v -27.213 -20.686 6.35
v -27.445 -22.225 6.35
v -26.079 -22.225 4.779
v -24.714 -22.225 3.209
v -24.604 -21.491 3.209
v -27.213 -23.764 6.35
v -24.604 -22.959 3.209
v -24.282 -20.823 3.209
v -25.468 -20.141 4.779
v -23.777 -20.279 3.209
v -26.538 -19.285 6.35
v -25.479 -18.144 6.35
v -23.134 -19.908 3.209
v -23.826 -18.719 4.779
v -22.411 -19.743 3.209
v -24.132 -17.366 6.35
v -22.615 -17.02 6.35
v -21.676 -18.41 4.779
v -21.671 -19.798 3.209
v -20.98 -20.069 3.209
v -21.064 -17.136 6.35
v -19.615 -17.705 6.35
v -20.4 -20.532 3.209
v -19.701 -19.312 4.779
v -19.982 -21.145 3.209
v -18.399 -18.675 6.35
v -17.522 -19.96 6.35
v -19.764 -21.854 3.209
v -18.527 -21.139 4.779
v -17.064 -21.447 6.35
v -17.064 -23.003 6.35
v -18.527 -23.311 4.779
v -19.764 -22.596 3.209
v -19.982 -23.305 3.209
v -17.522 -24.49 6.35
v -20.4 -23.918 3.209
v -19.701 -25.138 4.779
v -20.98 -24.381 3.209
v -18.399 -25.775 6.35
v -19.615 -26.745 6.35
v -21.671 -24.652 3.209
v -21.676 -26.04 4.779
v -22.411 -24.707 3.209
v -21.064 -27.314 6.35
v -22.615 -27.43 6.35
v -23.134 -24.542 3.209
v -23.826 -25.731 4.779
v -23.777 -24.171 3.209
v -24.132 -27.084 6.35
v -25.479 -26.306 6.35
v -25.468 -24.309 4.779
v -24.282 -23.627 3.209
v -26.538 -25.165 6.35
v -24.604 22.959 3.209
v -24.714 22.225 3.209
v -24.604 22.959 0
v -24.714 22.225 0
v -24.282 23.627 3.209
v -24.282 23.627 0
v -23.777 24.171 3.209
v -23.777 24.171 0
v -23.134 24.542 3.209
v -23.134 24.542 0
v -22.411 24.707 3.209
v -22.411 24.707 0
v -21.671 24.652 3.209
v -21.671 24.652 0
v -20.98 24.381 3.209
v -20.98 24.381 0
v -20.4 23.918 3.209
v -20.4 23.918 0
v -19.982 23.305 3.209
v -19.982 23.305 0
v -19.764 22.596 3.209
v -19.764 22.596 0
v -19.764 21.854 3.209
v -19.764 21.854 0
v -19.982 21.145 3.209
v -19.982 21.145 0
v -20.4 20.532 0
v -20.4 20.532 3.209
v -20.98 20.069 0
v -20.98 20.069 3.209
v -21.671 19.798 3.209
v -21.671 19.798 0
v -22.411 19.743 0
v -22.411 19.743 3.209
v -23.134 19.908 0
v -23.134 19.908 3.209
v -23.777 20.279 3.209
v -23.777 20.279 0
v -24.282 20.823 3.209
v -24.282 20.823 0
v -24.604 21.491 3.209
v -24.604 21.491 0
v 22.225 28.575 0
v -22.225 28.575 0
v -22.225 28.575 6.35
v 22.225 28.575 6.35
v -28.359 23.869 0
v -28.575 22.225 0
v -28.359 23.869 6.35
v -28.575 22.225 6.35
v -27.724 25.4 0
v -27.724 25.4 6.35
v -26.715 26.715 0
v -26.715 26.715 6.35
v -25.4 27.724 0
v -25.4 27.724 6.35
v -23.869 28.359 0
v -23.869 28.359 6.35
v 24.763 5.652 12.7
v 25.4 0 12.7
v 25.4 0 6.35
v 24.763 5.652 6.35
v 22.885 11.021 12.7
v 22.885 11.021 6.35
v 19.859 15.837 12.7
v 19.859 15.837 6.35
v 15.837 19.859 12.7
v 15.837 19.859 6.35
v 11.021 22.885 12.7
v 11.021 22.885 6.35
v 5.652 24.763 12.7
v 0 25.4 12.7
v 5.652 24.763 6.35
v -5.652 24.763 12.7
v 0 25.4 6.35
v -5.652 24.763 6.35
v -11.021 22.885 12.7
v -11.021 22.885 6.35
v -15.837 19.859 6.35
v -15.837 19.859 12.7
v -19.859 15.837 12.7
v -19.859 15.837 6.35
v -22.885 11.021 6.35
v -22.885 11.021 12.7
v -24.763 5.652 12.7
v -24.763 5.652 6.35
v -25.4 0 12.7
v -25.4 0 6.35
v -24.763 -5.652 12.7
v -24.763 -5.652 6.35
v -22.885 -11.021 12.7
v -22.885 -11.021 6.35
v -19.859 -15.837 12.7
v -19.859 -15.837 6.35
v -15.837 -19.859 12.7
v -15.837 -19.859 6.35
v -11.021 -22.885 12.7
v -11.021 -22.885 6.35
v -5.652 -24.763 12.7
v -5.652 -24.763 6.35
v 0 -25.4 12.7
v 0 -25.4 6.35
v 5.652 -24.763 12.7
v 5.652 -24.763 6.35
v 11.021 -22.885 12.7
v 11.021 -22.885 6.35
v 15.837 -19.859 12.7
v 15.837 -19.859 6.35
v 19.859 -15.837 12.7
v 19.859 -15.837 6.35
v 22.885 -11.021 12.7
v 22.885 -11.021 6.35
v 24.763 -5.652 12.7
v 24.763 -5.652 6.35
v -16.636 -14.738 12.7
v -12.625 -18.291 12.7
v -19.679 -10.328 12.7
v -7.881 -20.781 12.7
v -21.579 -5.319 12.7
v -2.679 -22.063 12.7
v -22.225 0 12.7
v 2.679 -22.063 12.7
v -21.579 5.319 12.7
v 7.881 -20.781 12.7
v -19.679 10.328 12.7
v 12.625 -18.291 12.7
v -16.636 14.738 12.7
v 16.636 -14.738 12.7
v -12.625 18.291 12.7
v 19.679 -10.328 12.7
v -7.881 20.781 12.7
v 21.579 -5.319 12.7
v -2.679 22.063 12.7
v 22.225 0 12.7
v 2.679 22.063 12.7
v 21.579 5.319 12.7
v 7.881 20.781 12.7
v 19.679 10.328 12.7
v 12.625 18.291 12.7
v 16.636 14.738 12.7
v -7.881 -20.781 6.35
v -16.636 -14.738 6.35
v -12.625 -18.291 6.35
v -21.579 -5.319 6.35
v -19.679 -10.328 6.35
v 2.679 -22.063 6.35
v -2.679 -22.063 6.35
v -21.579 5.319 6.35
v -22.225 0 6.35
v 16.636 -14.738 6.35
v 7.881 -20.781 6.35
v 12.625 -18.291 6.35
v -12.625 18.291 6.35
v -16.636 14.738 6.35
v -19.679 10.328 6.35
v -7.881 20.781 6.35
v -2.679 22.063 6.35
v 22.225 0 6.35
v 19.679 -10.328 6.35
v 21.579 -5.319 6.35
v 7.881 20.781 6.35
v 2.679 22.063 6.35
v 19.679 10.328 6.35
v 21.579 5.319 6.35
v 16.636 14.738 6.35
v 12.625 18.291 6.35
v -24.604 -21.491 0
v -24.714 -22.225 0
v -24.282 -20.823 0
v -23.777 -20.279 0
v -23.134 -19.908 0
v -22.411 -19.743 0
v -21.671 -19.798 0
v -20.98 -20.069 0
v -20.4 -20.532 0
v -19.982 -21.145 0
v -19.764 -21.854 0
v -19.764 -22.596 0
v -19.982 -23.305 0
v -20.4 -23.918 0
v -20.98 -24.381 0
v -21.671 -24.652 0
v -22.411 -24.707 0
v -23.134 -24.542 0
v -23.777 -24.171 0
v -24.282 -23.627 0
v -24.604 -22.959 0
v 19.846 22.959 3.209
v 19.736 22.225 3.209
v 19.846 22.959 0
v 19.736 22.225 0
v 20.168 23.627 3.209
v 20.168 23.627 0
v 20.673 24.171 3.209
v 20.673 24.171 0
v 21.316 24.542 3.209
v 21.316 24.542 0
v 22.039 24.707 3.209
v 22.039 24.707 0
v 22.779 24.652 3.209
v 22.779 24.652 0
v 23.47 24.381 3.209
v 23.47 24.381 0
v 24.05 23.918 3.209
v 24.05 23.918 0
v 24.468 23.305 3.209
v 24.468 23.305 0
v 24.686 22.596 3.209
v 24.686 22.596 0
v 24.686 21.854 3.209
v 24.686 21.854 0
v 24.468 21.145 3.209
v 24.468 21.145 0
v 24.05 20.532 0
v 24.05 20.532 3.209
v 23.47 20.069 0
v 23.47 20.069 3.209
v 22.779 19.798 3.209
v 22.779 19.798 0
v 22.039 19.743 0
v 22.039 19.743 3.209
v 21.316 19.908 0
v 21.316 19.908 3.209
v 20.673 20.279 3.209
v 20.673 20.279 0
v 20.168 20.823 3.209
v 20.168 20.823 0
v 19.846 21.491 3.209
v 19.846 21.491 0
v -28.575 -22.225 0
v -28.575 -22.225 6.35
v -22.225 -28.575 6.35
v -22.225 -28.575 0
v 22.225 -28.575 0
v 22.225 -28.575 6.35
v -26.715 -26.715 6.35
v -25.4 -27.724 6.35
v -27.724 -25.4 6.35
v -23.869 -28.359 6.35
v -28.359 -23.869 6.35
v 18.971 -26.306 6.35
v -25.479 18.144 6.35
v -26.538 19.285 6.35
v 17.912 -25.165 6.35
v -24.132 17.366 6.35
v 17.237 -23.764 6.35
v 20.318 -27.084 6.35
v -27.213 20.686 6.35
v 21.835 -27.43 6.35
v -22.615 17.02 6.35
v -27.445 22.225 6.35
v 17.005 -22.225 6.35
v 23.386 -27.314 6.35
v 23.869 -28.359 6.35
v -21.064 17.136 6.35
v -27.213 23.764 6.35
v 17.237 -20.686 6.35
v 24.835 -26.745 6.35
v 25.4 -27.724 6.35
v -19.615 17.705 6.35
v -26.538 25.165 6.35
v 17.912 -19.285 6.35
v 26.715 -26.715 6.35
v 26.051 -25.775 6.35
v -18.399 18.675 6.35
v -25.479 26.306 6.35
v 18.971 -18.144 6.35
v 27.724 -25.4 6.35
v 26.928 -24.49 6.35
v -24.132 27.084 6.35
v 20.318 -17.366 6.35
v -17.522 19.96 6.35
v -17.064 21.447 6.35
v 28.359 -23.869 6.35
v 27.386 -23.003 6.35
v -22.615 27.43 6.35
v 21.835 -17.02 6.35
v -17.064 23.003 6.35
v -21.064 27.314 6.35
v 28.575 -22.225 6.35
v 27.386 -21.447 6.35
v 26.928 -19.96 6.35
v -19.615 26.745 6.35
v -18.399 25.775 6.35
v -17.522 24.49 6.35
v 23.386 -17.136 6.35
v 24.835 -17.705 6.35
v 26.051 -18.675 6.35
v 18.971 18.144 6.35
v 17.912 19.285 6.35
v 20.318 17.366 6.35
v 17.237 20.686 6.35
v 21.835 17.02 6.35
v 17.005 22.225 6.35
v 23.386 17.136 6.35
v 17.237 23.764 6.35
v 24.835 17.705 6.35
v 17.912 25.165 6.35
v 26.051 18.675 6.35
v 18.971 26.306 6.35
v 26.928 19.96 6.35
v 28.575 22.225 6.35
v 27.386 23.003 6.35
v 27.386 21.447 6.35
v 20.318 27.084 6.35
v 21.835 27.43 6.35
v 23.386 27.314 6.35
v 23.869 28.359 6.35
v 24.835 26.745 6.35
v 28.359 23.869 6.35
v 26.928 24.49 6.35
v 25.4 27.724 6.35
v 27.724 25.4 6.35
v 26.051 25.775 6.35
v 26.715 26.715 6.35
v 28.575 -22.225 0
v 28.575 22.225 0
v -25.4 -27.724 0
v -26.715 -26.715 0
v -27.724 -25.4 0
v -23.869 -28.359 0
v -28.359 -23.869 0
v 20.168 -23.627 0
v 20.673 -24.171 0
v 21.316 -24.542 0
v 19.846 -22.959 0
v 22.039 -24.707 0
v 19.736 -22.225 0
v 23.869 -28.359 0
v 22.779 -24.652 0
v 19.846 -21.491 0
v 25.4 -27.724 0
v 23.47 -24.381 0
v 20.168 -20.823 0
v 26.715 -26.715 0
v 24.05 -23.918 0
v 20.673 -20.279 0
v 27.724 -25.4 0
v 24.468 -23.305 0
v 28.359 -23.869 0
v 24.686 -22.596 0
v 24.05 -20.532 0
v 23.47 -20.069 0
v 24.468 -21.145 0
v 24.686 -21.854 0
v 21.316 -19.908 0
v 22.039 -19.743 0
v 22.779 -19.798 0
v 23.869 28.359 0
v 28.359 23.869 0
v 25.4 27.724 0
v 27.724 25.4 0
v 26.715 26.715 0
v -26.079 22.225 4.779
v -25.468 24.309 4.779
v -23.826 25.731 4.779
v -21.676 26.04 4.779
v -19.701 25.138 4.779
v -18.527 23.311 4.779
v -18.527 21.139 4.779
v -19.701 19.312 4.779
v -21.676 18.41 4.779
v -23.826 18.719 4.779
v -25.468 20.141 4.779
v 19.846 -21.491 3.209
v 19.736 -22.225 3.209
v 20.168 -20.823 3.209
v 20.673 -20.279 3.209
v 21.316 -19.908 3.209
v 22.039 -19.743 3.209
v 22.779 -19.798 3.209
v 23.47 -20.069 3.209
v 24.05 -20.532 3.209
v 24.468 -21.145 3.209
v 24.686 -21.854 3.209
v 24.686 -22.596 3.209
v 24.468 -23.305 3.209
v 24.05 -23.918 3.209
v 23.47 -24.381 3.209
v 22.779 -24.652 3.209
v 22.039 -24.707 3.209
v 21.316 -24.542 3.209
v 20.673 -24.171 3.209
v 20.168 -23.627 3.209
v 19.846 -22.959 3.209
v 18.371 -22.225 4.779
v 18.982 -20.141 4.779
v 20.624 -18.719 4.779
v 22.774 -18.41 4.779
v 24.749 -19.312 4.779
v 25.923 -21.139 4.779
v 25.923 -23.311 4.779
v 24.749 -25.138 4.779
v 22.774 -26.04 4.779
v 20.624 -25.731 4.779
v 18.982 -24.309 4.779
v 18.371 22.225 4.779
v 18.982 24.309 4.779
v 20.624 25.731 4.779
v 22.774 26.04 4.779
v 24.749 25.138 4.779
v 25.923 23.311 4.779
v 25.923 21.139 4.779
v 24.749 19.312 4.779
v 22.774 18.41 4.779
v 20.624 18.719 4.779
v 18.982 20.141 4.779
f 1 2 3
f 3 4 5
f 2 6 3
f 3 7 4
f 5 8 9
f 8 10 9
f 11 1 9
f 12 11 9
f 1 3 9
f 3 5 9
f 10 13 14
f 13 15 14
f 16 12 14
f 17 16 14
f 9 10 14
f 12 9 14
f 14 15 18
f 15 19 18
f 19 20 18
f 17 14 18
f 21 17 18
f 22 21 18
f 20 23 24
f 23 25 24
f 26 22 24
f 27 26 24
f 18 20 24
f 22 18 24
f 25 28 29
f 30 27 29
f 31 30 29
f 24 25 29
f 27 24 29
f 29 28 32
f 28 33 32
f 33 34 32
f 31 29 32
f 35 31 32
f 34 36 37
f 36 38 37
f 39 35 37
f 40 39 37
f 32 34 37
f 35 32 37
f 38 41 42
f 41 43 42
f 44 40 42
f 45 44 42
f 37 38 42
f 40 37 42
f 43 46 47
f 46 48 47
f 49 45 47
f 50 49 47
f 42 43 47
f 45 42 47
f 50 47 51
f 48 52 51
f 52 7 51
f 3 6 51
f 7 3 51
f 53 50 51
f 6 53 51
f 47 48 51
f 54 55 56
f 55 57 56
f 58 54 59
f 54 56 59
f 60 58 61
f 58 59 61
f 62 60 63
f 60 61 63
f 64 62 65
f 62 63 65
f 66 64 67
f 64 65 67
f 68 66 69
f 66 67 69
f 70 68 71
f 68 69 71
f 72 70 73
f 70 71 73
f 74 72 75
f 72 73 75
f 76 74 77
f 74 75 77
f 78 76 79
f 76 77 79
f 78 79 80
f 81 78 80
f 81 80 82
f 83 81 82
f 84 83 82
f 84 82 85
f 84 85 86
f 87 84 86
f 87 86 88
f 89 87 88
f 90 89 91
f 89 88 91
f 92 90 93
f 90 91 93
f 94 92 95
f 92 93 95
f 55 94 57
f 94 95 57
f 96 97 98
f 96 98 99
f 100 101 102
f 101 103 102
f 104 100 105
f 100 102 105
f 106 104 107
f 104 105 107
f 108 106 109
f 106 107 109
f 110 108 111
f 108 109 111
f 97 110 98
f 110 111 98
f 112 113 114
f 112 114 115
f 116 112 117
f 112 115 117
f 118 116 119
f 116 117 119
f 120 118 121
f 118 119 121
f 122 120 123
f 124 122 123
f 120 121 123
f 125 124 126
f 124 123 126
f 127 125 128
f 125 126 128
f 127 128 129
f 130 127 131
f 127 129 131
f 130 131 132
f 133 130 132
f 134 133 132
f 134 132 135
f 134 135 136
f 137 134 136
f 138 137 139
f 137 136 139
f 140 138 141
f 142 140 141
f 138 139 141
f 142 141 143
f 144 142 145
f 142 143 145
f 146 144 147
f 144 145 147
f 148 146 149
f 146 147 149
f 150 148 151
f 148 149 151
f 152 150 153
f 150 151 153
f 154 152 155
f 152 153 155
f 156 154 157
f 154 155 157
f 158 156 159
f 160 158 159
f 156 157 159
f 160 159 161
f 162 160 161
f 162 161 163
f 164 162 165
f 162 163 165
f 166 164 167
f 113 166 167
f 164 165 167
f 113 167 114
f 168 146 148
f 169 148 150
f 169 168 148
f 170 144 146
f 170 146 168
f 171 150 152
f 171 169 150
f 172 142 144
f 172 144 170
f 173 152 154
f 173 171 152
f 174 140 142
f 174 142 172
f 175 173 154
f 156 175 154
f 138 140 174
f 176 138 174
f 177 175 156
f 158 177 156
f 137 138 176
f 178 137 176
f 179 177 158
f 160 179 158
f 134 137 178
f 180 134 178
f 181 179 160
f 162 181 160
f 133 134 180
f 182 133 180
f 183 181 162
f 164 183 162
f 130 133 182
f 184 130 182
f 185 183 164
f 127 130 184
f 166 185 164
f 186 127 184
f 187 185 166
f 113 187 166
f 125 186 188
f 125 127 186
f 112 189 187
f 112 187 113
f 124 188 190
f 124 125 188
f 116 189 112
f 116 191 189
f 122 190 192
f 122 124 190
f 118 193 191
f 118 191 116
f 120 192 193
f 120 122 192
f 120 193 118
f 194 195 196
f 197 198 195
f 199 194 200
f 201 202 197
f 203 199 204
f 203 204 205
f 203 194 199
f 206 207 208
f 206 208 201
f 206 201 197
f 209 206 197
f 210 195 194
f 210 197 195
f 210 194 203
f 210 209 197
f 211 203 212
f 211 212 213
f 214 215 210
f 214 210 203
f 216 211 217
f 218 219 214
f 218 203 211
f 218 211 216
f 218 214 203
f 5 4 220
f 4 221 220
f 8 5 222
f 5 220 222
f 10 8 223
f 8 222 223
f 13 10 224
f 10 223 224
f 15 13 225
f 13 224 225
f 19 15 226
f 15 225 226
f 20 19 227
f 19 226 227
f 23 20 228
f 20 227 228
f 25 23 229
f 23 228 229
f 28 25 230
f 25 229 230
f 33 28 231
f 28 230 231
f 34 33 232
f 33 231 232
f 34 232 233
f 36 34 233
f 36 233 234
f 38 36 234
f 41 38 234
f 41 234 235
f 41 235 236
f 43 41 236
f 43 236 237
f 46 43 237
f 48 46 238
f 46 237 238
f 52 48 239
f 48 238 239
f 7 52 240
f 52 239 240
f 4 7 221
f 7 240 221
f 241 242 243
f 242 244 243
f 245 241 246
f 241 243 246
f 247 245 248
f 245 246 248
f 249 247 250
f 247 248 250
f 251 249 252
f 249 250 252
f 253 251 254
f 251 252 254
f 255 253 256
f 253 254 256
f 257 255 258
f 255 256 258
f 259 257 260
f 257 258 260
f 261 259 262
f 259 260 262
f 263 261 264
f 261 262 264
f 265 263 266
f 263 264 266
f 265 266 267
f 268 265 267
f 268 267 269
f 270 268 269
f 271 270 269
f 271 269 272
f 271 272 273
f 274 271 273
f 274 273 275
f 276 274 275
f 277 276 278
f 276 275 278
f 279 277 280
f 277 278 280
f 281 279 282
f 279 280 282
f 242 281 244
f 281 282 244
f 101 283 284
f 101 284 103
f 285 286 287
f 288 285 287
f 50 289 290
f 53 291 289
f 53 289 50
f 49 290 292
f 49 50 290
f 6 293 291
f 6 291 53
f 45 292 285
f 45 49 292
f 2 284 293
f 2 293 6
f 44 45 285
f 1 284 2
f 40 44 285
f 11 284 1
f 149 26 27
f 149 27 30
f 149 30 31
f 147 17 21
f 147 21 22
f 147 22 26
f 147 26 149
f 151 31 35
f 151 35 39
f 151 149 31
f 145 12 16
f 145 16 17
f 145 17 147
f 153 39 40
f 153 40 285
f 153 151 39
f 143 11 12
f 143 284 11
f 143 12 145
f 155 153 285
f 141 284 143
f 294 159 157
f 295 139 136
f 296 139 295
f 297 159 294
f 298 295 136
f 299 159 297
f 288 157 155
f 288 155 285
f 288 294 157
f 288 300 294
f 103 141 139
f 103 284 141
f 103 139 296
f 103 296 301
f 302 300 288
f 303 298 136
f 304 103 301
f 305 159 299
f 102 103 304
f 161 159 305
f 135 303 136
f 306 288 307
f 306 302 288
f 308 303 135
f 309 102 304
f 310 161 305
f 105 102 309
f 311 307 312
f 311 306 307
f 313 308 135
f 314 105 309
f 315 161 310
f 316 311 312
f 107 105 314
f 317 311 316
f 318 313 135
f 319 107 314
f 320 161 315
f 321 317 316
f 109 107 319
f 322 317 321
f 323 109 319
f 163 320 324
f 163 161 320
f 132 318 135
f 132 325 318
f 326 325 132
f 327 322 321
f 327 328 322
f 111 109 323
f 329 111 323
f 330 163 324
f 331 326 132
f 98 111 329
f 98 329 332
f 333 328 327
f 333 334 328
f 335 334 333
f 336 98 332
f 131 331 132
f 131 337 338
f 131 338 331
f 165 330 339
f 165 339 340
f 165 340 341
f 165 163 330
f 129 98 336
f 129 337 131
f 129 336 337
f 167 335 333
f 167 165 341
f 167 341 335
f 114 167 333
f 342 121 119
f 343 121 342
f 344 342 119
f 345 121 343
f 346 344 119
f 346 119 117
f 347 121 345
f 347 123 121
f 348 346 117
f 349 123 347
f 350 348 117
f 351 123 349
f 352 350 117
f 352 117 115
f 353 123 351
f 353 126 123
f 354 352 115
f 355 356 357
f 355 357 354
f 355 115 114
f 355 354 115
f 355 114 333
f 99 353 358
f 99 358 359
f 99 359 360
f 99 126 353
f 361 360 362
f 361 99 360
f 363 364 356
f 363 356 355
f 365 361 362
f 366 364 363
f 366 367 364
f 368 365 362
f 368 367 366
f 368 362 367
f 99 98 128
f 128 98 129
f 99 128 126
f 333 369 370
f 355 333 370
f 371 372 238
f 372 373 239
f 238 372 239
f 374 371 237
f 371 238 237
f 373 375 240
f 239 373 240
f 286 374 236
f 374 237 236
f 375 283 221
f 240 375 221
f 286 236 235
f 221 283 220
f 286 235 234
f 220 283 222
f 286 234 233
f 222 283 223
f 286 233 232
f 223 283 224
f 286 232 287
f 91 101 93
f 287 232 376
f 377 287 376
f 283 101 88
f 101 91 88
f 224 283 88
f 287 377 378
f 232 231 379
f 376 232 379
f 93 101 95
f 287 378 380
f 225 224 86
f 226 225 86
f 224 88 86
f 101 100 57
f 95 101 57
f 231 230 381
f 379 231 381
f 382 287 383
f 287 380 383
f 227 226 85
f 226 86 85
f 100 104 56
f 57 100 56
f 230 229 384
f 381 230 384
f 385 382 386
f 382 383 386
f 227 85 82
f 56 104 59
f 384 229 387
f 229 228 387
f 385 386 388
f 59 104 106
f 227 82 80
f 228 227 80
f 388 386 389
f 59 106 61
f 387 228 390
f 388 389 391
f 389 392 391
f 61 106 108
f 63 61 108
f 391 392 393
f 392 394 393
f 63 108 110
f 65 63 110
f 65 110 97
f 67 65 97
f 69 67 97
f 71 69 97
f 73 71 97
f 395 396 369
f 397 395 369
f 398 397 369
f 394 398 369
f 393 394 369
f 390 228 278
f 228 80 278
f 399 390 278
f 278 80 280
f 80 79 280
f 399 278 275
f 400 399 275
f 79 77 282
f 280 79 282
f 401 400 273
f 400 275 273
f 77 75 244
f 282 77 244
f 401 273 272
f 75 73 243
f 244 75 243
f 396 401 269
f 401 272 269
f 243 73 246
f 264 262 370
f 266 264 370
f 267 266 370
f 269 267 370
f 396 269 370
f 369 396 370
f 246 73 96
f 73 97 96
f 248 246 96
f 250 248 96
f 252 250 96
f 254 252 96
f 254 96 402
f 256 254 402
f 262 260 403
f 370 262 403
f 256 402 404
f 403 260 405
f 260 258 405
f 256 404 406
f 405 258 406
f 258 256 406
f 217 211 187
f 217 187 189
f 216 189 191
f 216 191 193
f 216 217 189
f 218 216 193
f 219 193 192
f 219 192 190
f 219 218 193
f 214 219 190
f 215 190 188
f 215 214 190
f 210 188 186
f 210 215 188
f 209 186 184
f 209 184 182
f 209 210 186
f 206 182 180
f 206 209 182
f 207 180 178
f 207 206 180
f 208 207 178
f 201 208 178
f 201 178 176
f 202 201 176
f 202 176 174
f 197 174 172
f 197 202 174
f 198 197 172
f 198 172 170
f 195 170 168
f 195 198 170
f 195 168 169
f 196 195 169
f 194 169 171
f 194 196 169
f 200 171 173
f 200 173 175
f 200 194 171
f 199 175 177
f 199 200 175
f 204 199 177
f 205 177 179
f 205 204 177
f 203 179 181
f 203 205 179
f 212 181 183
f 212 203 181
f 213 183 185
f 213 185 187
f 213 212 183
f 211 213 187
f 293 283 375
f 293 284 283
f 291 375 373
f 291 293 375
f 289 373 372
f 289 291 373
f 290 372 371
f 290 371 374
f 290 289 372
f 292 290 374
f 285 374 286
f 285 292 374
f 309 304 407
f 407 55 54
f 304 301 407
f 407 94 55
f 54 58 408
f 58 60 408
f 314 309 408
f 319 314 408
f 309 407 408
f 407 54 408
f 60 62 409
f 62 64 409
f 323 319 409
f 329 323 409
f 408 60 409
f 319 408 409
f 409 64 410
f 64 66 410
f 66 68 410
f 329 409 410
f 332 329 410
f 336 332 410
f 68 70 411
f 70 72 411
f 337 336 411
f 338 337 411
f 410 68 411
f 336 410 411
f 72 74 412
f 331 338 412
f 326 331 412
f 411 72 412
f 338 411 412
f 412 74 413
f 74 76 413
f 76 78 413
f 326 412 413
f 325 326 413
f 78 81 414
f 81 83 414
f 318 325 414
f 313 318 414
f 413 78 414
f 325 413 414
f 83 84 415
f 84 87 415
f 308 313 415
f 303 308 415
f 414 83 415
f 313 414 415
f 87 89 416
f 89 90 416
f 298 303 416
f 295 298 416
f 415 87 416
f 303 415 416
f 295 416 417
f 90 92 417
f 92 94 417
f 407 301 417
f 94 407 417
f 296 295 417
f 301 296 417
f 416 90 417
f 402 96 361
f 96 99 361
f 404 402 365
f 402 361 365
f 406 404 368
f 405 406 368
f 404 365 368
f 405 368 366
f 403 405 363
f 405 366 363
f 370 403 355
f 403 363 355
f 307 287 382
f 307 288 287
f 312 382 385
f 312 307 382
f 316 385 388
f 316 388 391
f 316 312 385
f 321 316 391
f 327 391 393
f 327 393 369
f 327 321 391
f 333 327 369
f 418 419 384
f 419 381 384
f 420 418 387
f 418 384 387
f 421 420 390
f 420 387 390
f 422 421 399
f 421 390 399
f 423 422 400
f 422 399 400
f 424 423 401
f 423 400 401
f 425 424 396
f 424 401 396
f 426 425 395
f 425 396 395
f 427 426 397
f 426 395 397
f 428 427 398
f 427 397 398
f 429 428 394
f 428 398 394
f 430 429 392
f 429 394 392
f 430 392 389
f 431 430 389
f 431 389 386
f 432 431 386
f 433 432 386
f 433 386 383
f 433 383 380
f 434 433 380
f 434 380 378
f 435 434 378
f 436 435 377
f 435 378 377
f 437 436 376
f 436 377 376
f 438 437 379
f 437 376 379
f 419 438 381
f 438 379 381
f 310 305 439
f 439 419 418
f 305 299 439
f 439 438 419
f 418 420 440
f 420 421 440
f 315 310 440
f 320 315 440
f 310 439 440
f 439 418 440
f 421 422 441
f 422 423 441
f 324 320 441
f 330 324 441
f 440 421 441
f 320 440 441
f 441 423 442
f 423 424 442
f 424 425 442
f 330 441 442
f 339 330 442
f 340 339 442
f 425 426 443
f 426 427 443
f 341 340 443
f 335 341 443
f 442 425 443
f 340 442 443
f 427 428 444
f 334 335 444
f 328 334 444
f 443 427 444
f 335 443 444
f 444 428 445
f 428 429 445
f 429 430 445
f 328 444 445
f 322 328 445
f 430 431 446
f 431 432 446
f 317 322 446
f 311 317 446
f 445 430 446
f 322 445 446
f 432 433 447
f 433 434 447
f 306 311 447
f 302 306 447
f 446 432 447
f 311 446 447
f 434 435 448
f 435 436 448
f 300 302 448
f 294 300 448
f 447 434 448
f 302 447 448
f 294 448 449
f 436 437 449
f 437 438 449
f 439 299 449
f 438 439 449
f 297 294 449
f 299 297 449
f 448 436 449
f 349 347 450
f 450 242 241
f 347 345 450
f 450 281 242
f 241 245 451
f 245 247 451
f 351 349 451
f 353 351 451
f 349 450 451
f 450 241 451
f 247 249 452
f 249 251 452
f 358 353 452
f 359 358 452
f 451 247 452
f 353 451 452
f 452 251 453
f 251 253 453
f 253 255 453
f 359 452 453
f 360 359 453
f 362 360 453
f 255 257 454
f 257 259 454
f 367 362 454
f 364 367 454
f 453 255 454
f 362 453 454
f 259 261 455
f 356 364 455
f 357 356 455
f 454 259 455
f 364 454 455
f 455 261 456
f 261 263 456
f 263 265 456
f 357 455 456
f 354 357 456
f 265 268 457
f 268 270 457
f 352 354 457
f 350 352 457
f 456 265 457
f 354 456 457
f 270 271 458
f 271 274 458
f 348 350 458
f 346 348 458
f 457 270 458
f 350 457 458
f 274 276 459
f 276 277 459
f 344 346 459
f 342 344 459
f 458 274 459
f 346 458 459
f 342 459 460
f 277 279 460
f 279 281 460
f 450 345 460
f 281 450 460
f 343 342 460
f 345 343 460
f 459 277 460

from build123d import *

# Parameters (mm, degrees)
F0_W           = 57.15
F0_H           = 57.15
F1_DEPTH       = 6.35
F3_D           = 4.9784
F3_CSINK_D     = 10.4394
F3_CSINK_ANGLE = 82
F4_R           = 25.4
F4_R_2         = 22.225
F5_DEPTH       = 6.35
F6_R           = 6.35


# Not quite as in the source:
# - a feature names something its author has since deleted; it is built from what else it names


with BuildPart() as f1:
    # F0 (on Top) → F1 (new body)
    with BuildSketch(Plane.XY):
        Rectangle(F0_W, F0_H)
    extrude(amount=F1_DEPTH)

    # F3 (through all)
    with Locations(Plane.XY.offset(6.35)):
        with Locations((-22.225, 22.225), (22.225, 22.225), (22.225, -22.225), (-22.225, -22.225)):
            CounterSinkHole(F3_D / 2, F3_CSINK_D / 2, counter_sink_angle=F3_CSINK_ANGLE)

    # F4 (on face) → F5 (join)
    with BuildSketch(Plane.XY.offset(6.35)):
        Circle(F4_R)
        Circle(F4_R_2, mode=Mode.SUBTRACT)
    extrude(amount=F5_DEPTH)

    # F6
    f6_edges = [f1.edges().sort_by_distance(p)[0] for p in [
        (28.575, 28.575, 3.175),
        (-28.575, 28.575, 3.175),
        (28.575, -28.575, 3.175),
        (-28.575, -28.575, 3.175),
    ]]
    fillet(f6_edges, radius=F6_R)


solid = f1.part
